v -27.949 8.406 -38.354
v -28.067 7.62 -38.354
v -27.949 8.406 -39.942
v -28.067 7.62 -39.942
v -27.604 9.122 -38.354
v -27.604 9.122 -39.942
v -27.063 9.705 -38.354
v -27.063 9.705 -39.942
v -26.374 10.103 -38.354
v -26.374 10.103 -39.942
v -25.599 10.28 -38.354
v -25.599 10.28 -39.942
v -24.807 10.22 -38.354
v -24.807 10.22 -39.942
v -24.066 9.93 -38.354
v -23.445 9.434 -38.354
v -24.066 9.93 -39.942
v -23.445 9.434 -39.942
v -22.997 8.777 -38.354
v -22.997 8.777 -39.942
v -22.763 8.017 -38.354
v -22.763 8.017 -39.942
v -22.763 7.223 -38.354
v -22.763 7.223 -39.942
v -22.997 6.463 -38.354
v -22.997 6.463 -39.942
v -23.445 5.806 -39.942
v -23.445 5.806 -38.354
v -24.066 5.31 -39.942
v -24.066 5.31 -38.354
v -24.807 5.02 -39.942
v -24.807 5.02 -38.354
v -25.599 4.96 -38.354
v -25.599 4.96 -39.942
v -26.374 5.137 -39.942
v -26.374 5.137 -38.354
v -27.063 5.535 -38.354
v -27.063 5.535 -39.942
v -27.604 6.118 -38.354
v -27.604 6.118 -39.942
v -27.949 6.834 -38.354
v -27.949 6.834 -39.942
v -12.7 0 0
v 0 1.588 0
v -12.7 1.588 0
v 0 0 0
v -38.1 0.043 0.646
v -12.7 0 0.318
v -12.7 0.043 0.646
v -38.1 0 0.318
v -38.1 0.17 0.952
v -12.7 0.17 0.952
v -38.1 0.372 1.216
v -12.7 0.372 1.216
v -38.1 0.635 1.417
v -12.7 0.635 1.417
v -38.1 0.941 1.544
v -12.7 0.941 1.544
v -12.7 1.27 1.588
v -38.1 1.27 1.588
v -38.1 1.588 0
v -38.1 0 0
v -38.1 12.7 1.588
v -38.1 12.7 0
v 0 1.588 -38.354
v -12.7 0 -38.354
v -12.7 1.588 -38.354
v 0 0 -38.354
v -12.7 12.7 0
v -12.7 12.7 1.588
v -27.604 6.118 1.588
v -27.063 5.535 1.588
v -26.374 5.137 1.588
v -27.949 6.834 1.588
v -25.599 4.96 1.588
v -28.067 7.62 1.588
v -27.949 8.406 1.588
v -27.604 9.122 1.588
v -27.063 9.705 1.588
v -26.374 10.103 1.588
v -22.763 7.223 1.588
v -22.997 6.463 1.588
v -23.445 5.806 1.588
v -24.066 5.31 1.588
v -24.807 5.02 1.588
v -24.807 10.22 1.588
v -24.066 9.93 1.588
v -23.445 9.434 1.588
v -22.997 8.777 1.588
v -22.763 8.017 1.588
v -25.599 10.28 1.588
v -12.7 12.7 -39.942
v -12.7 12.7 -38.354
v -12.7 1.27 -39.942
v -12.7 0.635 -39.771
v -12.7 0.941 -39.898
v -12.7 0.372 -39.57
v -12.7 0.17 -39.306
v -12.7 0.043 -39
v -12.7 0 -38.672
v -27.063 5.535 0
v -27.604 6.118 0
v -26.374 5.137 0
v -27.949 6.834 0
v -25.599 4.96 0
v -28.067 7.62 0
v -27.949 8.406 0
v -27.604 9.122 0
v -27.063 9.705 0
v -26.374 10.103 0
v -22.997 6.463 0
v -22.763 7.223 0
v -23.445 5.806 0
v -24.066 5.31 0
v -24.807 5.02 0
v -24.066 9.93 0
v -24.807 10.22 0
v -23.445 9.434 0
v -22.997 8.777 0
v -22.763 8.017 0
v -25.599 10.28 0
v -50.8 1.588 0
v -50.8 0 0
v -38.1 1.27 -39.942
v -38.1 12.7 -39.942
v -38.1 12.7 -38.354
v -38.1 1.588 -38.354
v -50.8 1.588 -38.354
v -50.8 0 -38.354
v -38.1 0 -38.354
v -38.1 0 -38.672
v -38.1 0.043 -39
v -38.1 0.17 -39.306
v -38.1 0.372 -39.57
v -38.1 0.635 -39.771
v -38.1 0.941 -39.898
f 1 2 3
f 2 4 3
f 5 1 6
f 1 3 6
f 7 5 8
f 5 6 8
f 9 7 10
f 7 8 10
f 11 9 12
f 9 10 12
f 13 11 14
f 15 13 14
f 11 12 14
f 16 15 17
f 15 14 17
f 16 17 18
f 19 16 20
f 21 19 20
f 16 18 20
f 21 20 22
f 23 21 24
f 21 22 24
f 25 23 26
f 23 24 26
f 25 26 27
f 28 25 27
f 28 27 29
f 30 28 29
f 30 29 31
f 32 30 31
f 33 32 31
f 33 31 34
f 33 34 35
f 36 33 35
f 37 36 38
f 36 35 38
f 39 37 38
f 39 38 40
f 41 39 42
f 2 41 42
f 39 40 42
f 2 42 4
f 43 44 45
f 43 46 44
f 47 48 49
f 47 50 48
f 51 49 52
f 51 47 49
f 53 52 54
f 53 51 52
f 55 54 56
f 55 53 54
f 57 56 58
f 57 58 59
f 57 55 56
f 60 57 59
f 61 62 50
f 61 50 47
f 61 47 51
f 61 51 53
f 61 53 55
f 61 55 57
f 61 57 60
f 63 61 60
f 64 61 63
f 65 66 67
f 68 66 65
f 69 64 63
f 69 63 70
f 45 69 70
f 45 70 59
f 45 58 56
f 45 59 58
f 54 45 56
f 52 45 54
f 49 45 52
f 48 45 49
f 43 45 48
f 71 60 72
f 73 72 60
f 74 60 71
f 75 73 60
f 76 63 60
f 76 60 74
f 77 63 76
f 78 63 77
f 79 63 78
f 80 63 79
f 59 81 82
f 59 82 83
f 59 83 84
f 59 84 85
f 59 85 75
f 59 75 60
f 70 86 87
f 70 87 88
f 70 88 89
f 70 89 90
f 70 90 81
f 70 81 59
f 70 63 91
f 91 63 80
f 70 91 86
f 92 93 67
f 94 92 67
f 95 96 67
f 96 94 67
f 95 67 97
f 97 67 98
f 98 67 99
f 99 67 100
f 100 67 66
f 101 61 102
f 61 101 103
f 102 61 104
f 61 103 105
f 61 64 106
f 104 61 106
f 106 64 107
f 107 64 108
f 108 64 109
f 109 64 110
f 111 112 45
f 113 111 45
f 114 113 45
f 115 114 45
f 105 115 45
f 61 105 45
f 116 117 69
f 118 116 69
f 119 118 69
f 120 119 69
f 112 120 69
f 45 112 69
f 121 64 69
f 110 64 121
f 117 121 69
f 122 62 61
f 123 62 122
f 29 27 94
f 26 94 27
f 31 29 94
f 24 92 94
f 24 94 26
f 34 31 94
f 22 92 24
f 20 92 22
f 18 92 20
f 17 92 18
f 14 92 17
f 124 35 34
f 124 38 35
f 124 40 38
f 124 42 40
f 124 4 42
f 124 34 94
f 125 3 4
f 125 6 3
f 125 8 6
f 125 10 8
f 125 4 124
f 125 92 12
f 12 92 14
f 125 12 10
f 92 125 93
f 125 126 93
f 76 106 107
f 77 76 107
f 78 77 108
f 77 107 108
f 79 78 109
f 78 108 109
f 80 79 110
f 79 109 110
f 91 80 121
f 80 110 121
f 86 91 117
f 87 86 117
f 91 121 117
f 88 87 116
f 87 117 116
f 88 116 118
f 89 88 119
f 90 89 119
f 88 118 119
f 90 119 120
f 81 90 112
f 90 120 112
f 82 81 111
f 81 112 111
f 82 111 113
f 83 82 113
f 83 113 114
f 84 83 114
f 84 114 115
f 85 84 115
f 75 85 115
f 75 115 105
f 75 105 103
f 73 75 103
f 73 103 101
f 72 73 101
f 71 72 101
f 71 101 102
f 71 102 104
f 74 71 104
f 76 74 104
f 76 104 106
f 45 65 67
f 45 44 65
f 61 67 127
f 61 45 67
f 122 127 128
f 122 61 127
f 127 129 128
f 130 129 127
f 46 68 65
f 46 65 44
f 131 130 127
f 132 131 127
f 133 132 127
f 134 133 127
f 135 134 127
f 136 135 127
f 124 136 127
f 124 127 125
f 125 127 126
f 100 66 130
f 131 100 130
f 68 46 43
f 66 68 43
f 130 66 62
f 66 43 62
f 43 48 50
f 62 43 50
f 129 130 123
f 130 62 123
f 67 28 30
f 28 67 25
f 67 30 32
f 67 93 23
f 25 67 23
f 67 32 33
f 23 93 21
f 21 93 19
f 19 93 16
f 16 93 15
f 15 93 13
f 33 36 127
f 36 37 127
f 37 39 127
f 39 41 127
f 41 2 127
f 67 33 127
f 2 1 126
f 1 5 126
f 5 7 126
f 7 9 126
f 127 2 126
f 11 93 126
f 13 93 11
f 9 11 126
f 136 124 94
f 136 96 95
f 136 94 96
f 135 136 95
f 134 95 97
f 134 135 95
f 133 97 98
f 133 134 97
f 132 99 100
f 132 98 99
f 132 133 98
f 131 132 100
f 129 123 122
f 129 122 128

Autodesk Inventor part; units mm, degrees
ref_plane "YZ Plane" through (0, 0, 0) normal (1, 0, 0) x (0, 1, 0)
ref_plane "XZ Plane" through (0, 0, 0) normal (0, 1, 0) x (-1, 0, 0)
ref_plane "XY Plane" through (0, 0, 0) normal (0, 0, 1) x (1, 0, 0)
sketch "Sketch1" plane through (0, 0, 0) normal (0, 1, 0) x (-1, 0, 0)
  line L0 (0, 0) -> (50.8, 0)
  line L1 (50.8, 0) -> (50.8, -38.354)
  line L2 (50.8, -38.354) -> (0, -38.354)
  line L3 (0, -38.354) -> (0, 0)
  dimension "d0" = 50.8
  dimension "d1" = 38.354
extrude "Extrusion1" add sketch "Sketch1" along normal blind 1.5875
sketch "Sketch2" plane through (-50.8, 0, 0) normal (0, 0, 1) x (1, 0, 0)
  line L0 (50.8, 0) -> (0, 0) projected
  line L1 (50.8, 0) -> (38.1, 0)
  line L2 (38.1, 0) -> (12.7, 0)
  line L3 (12.7, 0) -> (12.7, 12.7)
  line L4 (12.7, 12.7) -> (38.1, 12.7)
  line L5 (38.1, 12.7) -> (38.1, 0)
  line L6 (50.8, 1.5875) -> (0, 1.5875) projected
  dimension "d4" = 12.7
  dimension "d5" = 25.4
  dimension "d6" = 12.7
extrude "Extrusion2" add sketch "Sketch2" along normal blind 1.5875
sketch "Sketch3" plane through (0, 0, -38.354) normal (0, 0, -1) x (-1, 0, 0)
  line L0 (0, 0) -> (0, 1.5875) projected
  line L1 (12.7, 0) -> (0, 0) projected
  line L2 (0, 0) -> (12.7, 0)
  line L3 (12.7, 0) -> (38.1, 0)
  line L4 (38.1, 0) -> (38.1, 12.7)
  line L5 (38.1, 12.7) -> (12.7, 12.7)
  line L6 (12.7, 12.7) -> (12.7, 0)
  dimension "d9" = 12.7
  dimension "d10" = 25.4
  dimension "d11" = 12.7
  dimension "d12" = 25.4
extrude "Extrusion3" add sketch "Sketch3" along normal blind 1.5875
sketch "Sketch4" plane through (0, 0, -39.9415) normal (0, 0, -1) x (-1, 0, 0)
  circle A0 centre (25.4, 7.62) radius 2.667
  line L0 (38.1, 0) -> (38.1, 12.7) projected
  line L1 (38.1, 12.7) -> (12.7, 12.7) projected
  point P0 (0, 0)
  dimension "d15" = 12.7
  dimension "d16" = 5.08
  dimension "d17" = 5.334
extrude "Extrusion4" cut sketch "Sketch4" against normal blind 50.8
fillet "Fillet1" radius 1.27 2 edges at (-25.4, 0, -39.9415) (-25.4, 0, 1.5875)
properties part number "L1 Gearbox Cover Top"
